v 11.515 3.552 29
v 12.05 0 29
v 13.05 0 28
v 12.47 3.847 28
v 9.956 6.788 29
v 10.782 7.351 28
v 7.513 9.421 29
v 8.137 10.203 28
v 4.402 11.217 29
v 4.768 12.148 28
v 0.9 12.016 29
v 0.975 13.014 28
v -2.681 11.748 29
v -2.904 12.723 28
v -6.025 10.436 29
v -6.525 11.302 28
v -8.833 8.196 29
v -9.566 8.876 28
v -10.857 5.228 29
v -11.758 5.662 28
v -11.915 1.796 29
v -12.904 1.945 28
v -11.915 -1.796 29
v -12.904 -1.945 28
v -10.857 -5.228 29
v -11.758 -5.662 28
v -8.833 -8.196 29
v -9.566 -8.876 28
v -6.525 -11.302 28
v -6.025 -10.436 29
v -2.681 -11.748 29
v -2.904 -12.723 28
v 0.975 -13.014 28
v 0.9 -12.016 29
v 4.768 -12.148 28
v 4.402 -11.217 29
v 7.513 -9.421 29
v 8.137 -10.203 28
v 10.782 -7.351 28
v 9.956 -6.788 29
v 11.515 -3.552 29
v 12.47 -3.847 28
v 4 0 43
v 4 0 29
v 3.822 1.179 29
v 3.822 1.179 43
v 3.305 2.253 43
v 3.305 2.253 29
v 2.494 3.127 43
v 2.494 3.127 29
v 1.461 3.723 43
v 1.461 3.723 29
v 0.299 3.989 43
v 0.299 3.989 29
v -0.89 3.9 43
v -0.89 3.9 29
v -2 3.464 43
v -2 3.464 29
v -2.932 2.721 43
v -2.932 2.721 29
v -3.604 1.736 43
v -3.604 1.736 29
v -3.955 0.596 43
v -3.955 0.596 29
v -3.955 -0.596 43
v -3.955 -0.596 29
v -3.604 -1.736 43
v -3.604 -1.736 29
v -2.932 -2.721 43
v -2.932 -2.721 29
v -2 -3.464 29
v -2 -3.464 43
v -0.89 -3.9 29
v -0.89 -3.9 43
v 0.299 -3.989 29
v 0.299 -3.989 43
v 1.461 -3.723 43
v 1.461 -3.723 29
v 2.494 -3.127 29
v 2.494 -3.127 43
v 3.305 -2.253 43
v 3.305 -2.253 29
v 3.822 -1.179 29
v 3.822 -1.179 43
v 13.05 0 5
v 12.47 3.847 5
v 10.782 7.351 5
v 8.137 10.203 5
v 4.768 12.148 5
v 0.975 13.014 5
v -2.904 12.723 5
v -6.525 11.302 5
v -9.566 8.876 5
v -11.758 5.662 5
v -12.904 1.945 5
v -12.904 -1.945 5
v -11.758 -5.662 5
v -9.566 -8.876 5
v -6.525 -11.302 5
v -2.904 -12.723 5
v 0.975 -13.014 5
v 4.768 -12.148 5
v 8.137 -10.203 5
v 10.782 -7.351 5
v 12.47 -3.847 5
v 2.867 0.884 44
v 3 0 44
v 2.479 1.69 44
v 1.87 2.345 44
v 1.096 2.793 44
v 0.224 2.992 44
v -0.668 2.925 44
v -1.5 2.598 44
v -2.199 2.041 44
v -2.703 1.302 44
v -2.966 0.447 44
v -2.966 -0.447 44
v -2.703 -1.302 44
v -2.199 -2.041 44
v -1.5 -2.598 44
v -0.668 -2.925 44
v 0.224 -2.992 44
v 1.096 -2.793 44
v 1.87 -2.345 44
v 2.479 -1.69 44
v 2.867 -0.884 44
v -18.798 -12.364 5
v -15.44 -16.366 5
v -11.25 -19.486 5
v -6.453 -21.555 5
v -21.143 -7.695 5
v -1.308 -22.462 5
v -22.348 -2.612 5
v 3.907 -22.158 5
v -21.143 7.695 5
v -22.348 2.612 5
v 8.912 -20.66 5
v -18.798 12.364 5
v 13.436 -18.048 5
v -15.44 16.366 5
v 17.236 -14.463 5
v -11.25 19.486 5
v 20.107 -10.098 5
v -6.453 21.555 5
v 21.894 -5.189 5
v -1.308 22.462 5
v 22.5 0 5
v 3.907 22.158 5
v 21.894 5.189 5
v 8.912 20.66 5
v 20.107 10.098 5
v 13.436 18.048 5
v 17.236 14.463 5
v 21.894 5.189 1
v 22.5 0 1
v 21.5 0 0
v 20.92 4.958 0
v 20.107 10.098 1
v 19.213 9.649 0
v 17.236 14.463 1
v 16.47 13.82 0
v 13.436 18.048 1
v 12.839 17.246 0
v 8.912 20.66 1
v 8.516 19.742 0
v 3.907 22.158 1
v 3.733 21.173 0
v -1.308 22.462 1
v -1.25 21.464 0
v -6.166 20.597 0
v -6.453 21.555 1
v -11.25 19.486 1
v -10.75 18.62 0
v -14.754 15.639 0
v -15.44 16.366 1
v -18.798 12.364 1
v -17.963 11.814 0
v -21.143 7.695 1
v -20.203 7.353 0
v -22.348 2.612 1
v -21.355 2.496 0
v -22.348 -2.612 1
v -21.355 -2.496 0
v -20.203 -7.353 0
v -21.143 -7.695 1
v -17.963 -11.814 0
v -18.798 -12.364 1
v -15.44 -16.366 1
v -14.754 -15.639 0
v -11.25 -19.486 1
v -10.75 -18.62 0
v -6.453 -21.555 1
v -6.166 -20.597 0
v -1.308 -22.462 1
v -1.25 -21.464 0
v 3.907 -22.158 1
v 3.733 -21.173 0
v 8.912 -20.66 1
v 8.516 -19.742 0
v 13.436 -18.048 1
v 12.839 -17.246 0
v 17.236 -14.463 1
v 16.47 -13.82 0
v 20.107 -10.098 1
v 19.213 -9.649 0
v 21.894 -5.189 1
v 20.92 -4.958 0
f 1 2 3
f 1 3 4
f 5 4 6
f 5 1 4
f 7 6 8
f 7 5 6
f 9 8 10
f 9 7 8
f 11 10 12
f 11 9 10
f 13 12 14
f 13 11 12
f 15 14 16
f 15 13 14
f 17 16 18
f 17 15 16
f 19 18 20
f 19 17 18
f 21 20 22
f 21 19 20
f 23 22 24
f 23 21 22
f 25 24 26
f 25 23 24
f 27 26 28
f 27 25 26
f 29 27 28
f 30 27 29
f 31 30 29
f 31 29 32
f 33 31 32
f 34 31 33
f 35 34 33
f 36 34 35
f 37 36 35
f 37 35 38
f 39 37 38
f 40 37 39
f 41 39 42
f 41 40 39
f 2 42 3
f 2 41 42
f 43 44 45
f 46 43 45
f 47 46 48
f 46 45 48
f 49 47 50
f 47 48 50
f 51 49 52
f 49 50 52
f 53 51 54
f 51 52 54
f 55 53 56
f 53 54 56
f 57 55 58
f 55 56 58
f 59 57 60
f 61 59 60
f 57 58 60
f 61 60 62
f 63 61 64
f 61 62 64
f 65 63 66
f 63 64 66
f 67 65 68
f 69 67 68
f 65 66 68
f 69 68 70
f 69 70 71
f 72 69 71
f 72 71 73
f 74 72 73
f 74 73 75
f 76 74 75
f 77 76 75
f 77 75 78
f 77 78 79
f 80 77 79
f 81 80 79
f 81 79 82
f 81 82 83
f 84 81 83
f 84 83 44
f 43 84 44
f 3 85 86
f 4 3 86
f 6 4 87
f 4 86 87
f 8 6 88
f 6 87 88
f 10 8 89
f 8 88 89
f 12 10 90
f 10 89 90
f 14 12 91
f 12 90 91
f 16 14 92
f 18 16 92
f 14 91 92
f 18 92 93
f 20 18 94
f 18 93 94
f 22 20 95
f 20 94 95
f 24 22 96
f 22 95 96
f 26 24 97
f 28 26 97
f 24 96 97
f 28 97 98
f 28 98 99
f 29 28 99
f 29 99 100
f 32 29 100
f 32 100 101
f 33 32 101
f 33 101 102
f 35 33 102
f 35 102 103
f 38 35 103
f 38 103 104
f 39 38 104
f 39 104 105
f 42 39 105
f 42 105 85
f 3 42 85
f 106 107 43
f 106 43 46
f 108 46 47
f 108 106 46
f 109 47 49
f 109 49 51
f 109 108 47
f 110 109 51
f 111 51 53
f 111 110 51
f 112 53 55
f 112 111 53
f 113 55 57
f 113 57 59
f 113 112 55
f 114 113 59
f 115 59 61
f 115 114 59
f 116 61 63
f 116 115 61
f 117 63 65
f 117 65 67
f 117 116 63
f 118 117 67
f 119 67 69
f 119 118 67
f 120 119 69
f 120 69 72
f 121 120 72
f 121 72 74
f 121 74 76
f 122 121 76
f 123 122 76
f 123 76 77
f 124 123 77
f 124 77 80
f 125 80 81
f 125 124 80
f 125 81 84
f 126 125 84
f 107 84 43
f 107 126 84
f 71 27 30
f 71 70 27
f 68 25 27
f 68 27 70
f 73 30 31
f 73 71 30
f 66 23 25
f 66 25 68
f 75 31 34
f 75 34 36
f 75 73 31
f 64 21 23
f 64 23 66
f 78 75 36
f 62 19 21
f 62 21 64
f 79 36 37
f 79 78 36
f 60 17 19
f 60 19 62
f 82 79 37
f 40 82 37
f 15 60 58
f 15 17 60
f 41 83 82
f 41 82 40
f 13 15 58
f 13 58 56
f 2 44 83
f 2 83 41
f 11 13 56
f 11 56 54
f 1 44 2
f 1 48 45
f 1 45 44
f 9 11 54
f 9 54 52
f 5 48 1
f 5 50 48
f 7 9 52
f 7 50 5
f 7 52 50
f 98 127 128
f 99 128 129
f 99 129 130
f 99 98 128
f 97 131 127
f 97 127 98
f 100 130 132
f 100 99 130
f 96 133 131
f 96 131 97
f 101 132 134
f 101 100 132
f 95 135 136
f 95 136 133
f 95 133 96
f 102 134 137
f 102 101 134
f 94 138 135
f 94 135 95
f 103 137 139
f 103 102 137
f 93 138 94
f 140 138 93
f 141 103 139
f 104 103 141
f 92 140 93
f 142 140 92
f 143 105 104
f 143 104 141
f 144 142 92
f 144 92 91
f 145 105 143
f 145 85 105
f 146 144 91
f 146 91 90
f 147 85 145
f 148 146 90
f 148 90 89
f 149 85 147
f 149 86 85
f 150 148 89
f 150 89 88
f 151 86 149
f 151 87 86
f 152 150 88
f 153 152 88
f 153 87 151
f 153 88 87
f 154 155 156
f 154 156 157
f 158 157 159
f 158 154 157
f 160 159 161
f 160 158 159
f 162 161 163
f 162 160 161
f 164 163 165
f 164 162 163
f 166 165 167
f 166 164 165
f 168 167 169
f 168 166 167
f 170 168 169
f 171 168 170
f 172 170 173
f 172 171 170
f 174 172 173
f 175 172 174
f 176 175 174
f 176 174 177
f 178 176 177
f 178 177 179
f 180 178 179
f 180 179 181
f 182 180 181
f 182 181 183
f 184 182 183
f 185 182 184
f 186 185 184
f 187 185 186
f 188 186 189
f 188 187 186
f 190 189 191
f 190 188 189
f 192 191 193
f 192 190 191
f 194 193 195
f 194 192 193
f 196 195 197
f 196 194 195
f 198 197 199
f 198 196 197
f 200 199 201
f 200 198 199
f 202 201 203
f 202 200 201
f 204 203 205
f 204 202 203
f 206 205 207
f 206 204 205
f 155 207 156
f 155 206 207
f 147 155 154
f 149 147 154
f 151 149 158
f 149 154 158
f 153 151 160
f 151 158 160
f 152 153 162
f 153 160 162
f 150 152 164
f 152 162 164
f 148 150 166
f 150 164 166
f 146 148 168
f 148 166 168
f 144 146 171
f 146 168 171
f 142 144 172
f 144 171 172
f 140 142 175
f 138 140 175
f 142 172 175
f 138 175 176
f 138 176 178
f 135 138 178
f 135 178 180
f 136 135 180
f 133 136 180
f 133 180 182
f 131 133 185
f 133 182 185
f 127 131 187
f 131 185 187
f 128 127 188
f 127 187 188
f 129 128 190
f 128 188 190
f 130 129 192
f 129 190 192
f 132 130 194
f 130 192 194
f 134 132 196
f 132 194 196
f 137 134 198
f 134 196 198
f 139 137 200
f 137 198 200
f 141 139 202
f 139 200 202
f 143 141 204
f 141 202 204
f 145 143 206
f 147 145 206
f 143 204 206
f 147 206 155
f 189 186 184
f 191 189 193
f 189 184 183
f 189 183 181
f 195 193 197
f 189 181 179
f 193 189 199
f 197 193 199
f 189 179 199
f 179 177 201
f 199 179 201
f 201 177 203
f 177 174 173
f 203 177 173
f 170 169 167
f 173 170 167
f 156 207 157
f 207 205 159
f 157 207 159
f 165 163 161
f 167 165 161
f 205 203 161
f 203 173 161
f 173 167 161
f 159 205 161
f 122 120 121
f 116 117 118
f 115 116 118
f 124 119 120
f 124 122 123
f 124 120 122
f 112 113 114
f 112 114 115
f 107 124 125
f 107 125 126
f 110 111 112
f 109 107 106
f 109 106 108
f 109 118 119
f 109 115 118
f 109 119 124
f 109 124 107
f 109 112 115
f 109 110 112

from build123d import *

# Parameters (mm, degrees)
F0_R     = 22.5
F1_DEPTH = 5
F2_R     = 13.05
F3_DEPTH = 29
F4_R     = 4
F5_DEPTH = 44
F6_SIZE  = 1


# Not quite as in the source:
# - a feature names something its author has since deleted; it is built from what else it names


with BuildPart() as f1:
    # F0 (on Top) → F1 (new body)
    with BuildSketch(Plane.XY):
        Circle(F0_R)
    extrude(amount=F1_DEPTH)

    # F2 (on Top) → F3 (join)
    with BuildSketch(Plane.XY):
        Circle(F2_R)
    extrude(amount=F3_DEPTH)

    # F4 (on Top) → F5 (join)
    with BuildSketch(Plane.XY):
        Circle(F4_R)
    extrude(amount=F5_DEPTH)

    # F6
    f6_edges = [f1.edges().sort_by_distance(p)[0] for p in [
        (-22.5, 0, 0),
        (-13.05, 0, 29),
        (-4, 0, 44),
    ]]
    chamfer(f6_edges, length=F6_SIZE)


solid = f1.part
